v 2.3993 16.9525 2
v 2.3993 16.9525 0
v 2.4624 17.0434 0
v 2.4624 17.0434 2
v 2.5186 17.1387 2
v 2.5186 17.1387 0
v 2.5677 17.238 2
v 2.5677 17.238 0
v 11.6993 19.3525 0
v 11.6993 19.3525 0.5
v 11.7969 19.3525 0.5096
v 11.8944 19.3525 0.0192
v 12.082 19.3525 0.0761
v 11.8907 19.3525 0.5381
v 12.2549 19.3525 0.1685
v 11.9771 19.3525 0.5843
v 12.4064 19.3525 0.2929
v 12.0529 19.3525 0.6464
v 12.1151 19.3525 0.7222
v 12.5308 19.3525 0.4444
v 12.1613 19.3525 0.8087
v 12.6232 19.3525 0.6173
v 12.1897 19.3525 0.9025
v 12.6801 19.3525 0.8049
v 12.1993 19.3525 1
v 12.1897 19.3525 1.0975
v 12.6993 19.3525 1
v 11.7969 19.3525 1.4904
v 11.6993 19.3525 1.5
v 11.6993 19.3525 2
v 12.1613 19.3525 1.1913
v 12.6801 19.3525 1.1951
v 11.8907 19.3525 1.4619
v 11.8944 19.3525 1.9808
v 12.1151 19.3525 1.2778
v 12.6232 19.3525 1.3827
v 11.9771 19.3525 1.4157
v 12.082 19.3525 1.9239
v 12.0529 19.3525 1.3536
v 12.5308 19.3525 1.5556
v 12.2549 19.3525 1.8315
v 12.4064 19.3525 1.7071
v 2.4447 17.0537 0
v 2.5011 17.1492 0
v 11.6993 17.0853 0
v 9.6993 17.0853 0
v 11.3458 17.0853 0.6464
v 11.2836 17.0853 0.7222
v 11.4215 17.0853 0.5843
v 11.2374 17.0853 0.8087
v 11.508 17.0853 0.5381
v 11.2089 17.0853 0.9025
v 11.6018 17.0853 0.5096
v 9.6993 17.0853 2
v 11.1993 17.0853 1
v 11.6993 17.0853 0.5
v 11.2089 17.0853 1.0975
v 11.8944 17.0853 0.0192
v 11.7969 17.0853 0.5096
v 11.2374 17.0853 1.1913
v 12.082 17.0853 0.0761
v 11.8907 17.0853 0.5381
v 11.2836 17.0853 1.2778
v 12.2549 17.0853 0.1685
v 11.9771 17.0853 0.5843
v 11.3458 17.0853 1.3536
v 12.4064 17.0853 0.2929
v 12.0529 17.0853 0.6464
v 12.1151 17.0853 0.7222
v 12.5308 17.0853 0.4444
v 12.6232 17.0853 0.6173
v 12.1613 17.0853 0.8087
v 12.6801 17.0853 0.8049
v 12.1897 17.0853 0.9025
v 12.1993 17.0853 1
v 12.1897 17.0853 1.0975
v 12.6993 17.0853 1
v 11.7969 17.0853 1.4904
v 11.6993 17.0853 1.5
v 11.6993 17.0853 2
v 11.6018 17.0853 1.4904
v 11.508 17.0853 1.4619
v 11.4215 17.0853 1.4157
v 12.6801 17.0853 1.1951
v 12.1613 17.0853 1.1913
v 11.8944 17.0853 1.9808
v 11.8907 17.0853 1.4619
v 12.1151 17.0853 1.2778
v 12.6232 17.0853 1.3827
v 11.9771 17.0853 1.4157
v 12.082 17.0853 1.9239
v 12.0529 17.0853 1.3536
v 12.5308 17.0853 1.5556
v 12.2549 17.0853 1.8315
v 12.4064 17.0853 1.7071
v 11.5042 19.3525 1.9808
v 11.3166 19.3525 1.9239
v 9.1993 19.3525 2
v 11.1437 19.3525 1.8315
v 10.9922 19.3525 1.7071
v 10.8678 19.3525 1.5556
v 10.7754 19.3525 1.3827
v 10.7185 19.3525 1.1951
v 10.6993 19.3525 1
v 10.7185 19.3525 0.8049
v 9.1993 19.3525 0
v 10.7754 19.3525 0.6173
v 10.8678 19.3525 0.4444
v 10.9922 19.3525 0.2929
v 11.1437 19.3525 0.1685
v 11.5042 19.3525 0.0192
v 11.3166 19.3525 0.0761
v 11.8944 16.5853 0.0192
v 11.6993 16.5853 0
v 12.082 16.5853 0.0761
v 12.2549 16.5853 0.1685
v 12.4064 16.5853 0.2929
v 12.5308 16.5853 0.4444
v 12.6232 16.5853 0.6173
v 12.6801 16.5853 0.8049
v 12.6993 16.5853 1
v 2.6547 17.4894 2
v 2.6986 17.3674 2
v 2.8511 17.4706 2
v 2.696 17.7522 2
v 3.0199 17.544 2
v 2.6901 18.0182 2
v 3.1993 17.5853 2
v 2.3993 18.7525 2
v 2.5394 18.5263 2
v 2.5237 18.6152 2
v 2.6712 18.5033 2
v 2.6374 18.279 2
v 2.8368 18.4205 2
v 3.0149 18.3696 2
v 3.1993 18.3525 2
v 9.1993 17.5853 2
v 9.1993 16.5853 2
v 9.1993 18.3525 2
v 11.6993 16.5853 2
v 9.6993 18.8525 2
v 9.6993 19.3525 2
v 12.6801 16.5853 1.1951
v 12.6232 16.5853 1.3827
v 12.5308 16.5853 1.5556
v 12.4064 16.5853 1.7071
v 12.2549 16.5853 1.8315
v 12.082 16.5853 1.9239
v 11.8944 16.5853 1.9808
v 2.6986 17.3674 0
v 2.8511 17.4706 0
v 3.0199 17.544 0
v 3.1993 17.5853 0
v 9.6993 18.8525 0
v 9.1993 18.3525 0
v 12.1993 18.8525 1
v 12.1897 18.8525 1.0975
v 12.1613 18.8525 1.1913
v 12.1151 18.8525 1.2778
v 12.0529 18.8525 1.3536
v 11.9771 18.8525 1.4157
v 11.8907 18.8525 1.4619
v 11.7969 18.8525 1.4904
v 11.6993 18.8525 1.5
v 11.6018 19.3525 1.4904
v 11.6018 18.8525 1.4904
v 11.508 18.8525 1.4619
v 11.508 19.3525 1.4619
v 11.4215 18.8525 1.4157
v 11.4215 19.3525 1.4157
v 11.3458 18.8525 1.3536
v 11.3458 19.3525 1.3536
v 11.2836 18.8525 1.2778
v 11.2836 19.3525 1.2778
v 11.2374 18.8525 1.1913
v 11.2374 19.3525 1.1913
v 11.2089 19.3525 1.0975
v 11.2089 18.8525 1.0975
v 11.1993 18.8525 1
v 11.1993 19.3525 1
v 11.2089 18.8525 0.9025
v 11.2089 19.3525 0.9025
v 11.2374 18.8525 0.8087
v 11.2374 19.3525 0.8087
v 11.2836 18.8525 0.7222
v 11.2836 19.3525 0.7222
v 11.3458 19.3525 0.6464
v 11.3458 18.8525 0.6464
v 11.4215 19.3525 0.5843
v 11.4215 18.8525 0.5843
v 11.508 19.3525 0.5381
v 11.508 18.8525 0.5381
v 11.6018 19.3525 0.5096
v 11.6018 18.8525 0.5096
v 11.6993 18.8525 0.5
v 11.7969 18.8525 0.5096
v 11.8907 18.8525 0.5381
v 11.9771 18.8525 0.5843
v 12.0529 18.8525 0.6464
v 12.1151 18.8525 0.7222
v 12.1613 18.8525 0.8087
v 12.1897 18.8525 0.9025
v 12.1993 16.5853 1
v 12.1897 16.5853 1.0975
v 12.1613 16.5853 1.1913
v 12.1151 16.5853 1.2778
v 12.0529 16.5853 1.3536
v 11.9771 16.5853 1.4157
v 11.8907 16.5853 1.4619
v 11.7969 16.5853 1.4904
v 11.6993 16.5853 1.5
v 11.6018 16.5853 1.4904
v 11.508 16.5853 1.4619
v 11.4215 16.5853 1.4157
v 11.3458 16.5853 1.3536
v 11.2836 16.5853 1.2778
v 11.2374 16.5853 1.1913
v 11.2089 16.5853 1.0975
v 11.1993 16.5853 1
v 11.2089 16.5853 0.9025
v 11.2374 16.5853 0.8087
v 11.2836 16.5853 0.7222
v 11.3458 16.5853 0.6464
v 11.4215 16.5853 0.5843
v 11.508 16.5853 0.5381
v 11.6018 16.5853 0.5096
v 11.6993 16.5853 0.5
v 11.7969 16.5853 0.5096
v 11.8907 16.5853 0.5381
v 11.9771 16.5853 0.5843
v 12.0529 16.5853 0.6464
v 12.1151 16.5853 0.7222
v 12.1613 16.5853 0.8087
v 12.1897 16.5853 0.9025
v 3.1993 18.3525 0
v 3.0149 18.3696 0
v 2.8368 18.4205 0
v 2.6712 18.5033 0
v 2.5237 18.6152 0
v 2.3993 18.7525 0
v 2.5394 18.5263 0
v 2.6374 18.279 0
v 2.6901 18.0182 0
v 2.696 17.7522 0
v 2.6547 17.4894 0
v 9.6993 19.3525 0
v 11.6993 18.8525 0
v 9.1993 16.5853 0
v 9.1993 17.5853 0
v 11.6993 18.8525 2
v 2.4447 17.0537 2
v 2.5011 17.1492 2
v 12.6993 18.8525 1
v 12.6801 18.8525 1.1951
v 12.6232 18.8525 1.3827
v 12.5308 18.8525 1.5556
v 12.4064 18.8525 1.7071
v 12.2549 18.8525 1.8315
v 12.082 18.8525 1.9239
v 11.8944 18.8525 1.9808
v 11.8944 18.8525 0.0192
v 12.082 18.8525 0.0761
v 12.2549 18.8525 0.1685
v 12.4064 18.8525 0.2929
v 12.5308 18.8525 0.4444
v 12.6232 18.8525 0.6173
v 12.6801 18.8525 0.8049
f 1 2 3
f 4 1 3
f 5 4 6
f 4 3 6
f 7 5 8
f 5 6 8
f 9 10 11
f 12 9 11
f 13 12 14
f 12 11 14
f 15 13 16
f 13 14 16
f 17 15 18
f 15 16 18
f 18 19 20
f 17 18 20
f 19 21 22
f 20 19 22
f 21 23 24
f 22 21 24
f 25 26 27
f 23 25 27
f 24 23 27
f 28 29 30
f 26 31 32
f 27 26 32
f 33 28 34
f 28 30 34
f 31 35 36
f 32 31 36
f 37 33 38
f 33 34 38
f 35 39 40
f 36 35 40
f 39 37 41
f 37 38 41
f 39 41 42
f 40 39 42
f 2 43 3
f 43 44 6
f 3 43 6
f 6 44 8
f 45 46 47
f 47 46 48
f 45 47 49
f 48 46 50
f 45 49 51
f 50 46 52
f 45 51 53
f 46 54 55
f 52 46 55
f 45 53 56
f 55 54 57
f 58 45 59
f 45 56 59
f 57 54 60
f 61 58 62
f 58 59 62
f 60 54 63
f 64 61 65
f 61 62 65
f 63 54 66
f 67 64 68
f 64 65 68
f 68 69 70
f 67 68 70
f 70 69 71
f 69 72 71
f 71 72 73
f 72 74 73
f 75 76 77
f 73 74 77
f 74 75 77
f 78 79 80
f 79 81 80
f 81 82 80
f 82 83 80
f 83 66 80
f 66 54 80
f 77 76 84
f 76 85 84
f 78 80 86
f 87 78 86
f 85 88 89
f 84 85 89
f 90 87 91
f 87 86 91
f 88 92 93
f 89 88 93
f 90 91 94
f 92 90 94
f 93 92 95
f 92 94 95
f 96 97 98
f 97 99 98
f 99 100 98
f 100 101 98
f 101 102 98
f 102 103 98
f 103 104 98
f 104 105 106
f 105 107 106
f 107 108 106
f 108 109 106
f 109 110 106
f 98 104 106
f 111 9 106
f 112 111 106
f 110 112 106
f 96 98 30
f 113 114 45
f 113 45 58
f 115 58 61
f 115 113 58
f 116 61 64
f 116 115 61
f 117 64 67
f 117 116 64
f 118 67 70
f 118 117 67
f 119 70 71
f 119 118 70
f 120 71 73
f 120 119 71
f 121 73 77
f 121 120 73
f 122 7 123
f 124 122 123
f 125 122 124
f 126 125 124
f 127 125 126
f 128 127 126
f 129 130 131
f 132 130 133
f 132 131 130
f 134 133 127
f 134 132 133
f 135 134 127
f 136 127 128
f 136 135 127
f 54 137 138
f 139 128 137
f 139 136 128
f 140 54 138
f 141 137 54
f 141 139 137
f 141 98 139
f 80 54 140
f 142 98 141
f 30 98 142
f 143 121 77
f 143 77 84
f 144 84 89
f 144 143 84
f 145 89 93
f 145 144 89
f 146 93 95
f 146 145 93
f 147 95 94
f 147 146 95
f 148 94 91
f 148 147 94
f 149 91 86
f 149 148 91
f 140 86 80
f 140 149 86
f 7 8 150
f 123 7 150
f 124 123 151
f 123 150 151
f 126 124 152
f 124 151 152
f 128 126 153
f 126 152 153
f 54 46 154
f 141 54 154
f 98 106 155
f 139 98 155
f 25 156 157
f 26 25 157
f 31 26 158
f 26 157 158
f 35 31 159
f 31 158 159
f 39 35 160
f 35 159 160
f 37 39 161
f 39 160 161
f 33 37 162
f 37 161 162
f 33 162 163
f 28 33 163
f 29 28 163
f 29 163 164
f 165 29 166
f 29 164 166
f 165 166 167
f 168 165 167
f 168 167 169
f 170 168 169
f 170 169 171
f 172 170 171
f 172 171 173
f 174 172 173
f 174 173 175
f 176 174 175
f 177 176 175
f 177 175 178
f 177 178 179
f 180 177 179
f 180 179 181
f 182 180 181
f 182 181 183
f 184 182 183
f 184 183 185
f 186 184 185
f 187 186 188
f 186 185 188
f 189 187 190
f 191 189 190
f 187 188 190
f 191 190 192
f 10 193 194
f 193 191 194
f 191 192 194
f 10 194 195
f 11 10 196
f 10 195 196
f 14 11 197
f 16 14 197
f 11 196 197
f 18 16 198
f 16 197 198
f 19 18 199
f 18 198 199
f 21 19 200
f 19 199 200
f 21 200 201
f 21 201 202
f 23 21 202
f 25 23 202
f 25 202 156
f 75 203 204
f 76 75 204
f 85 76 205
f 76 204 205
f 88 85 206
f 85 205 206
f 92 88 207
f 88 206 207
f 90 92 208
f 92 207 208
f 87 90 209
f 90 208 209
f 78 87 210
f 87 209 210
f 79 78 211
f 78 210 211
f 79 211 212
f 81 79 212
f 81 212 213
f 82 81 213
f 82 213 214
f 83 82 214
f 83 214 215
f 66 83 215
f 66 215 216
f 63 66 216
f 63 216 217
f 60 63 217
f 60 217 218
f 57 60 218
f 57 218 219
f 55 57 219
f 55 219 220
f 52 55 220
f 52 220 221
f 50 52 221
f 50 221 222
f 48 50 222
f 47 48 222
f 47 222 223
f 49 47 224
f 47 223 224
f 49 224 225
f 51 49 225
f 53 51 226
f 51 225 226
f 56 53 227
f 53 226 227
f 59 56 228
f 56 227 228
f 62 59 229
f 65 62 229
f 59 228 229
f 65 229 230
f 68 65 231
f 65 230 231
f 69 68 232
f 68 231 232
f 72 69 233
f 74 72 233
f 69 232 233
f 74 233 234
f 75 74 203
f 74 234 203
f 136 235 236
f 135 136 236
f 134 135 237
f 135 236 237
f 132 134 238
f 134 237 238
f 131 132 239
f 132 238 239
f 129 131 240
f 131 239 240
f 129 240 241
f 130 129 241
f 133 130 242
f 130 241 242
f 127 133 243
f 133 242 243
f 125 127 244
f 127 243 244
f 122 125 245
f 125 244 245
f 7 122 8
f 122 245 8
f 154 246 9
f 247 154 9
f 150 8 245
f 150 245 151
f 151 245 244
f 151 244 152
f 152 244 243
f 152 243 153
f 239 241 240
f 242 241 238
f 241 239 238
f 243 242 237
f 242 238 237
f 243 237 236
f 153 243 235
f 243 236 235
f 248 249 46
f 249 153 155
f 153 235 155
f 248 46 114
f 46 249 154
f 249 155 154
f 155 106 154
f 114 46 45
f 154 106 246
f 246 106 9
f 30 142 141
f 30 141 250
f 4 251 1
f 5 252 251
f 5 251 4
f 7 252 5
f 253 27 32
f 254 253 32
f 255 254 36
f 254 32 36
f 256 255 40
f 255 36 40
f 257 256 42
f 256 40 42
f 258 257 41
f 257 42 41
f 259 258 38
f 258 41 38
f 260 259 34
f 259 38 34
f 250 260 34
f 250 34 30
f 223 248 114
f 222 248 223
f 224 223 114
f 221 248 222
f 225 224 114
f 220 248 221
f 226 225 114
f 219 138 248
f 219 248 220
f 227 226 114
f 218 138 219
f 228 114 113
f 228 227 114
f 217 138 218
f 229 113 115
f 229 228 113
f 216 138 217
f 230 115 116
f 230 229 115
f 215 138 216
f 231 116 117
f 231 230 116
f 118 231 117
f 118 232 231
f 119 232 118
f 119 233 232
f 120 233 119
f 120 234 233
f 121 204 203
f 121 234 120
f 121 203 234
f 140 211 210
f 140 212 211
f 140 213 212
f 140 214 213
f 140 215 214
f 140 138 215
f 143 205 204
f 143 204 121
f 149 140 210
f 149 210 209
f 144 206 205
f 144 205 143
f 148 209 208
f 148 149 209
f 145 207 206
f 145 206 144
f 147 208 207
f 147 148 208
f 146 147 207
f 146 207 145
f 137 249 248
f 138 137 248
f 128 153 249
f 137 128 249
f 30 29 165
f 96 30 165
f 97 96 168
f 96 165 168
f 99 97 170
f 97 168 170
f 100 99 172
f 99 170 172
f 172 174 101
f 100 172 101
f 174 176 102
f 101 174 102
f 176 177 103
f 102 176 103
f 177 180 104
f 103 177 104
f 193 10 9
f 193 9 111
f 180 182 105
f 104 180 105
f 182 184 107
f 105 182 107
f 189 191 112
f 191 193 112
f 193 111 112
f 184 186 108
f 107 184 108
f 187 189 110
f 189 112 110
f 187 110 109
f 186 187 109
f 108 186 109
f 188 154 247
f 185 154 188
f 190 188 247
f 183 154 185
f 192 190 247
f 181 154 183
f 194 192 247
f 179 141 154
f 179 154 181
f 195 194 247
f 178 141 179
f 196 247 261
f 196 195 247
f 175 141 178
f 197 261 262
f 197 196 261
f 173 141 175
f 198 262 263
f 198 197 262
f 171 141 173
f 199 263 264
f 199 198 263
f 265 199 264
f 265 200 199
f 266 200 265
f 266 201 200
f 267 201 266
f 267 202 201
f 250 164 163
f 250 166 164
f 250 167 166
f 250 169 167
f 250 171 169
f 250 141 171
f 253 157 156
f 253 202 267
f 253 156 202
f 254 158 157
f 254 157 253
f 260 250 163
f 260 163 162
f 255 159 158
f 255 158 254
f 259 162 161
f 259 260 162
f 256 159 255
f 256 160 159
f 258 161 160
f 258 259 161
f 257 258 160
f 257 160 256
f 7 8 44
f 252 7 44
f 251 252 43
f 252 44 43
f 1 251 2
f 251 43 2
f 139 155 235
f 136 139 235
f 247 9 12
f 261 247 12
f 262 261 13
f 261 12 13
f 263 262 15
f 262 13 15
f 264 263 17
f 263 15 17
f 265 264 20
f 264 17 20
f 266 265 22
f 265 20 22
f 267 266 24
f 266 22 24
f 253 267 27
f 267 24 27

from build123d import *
from build123d import SkipClean  # not in build123d's __all__

# Parameters (mm, degrees)
F1_DEPTH = 2
F3_DEPTH = 0.5
F5_DEPTH = 0.5
F6_R     = 0.5
F7_DEPTH = 25


# Not quite as in the source:
# - a pattern or mirror of a feature is missing from the dataset's text; its kind, count and spacing are read off the source's solid


with BuildPart() as f1:
    # F0 (on Top) → F1 (new body)
    with BuildSketch(Plane.XY):
        with BuildLine():
            ThreePointArc((2.399318749, 16.9524586827), (2.4914108716, 17.0905545243), (2.5676812283, 17.23797994))
            ThreePointArc((2.5676812283, 17.23797994), (2.4715876211, 17.1022436421), (2.399318749, 16.9524586827))
        make_face()
    extrude(amount=F1_DEPTH)


with BuildPart() as f1b:
    # F0 (on Top) → F1, piece 2 (new body)
    with BuildSketch(Plane.XY):
        with BuildLine():
            ThreePointArc((3.199318749, 18.3524586827), (2.7521051535, 18.4580314917), (2.399318749, 18.7524586827))
            ThreePointArc((2.399318749, 18.7524586827), (2.6901349421, 18.0181906296), (2.5676812283, 17.23797994))
            ThreePointArc((2.5676812283, 17.23797994), (2.8511129134, 17.4705505548), (3.199318749, 17.5853342952))
            Line((3.199318749, 17.5853342952), (9.199318749, 17.5853342952))
            Line((9.199318749, 17.5853342952), (9.199318749, 16.5853342952))
            Line((9.199318749, 16.5853342952), (11.699318749, 16.5853342952))
            Line((11.699318749, 16.5853342952), (11.699318749, 17.0853342952))
            Line((11.699318749, 17.0853342952), (9.699318749, 17.0853342952))
            Line((9.699318749, 17.0853342952), (9.699318749, 18.8524586827))
            Line((9.699318749, 18.8524586827), (11.699318749, 18.8524586827))
            Line((11.699318749, 18.8524586827), (11.699318749, 19.3524586827))
            Line((11.699318749, 19.3524586827), (9.199318749, 19.3524586827))
            Line((9.199318749, 19.3524586827), (9.199318749, 18.3524586827))
            Line((9.199318749, 18.3524586827), (3.199318749, 18.3524586827))
        make_face()
    extrude(amount=F1_DEPTH)

    # F2 (on face) → F3 (join)
    with BuildSketch(Plane.XZ.offset(-16.5853342952)):
        with BuildLine():
            ThreePointArc((11.699318749, 0), (12.4064255302, 0.2928932188), (12.699318749, 1))
            ThreePointArc((12.699318749, 1), (12.4064255302, 1.7071067812), (11.699318749, 2))
            Line((11.699318749, 2), (11.699318749, 0))
        make_face()
        with BuildLine():
            Line((11.699318749, 0), (11.699318749, 2))
            ThreePointArc((11.699318749, 2), (10.699318749, 1), (11.699318749, 0))
        make_face()
        with BuildLine():
            ThreePointArc((11.699318749, 0), (10.699318749, 1), (11.699318749, 2))
            Line((11.699318749, 2), (9.699318749, 2))
            Line((9.699318749, 2), (9.699318749, 0))
            Line((9.699318749, 0), (11.699318749, 0))
        make_face()
    f3 = extrude(amount=-F3_DEPTH)

    # F3_copies: F3 across plane
    with SkipClean():  # cleaning this boolean's faces spoils the solid; the shape is the same uncleaned
        add(f3.mirror(Plane.ZX.offset(17.968896)), clean=False)

    # F4 (on face) → F5 (join)
    with BuildSketch(Plane.XZ.offset(-18.8524586827)):
        with BuildLine():
            Line((11.699318749, 0), (11.699318749, 2))
            ThreePointArc((11.699318749, 2), (10.699318749, 1), (11.699318749, 0))
        make_face()
    with SkipClean():  # cleaning this boolean's faces spoils the solid; the shape is the same uncleaned
        extrude(amount=-F5_DEPTH)

    # F6 (on face) → F7 (cut)
    with BuildSketch(Plane.XZ.offset(-16.5853342952)):
        with Locations((11.699318749, 1)):
            Circle(F6_R)
    with SkipClean():  # cleaning this boolean's faces spoils the solid; the shape is the same uncleaned
        extrude(amount=-F7_DEPTH, mode=Mode.SUBTRACT)


solid = Compound([f1.part, f1b.part])
